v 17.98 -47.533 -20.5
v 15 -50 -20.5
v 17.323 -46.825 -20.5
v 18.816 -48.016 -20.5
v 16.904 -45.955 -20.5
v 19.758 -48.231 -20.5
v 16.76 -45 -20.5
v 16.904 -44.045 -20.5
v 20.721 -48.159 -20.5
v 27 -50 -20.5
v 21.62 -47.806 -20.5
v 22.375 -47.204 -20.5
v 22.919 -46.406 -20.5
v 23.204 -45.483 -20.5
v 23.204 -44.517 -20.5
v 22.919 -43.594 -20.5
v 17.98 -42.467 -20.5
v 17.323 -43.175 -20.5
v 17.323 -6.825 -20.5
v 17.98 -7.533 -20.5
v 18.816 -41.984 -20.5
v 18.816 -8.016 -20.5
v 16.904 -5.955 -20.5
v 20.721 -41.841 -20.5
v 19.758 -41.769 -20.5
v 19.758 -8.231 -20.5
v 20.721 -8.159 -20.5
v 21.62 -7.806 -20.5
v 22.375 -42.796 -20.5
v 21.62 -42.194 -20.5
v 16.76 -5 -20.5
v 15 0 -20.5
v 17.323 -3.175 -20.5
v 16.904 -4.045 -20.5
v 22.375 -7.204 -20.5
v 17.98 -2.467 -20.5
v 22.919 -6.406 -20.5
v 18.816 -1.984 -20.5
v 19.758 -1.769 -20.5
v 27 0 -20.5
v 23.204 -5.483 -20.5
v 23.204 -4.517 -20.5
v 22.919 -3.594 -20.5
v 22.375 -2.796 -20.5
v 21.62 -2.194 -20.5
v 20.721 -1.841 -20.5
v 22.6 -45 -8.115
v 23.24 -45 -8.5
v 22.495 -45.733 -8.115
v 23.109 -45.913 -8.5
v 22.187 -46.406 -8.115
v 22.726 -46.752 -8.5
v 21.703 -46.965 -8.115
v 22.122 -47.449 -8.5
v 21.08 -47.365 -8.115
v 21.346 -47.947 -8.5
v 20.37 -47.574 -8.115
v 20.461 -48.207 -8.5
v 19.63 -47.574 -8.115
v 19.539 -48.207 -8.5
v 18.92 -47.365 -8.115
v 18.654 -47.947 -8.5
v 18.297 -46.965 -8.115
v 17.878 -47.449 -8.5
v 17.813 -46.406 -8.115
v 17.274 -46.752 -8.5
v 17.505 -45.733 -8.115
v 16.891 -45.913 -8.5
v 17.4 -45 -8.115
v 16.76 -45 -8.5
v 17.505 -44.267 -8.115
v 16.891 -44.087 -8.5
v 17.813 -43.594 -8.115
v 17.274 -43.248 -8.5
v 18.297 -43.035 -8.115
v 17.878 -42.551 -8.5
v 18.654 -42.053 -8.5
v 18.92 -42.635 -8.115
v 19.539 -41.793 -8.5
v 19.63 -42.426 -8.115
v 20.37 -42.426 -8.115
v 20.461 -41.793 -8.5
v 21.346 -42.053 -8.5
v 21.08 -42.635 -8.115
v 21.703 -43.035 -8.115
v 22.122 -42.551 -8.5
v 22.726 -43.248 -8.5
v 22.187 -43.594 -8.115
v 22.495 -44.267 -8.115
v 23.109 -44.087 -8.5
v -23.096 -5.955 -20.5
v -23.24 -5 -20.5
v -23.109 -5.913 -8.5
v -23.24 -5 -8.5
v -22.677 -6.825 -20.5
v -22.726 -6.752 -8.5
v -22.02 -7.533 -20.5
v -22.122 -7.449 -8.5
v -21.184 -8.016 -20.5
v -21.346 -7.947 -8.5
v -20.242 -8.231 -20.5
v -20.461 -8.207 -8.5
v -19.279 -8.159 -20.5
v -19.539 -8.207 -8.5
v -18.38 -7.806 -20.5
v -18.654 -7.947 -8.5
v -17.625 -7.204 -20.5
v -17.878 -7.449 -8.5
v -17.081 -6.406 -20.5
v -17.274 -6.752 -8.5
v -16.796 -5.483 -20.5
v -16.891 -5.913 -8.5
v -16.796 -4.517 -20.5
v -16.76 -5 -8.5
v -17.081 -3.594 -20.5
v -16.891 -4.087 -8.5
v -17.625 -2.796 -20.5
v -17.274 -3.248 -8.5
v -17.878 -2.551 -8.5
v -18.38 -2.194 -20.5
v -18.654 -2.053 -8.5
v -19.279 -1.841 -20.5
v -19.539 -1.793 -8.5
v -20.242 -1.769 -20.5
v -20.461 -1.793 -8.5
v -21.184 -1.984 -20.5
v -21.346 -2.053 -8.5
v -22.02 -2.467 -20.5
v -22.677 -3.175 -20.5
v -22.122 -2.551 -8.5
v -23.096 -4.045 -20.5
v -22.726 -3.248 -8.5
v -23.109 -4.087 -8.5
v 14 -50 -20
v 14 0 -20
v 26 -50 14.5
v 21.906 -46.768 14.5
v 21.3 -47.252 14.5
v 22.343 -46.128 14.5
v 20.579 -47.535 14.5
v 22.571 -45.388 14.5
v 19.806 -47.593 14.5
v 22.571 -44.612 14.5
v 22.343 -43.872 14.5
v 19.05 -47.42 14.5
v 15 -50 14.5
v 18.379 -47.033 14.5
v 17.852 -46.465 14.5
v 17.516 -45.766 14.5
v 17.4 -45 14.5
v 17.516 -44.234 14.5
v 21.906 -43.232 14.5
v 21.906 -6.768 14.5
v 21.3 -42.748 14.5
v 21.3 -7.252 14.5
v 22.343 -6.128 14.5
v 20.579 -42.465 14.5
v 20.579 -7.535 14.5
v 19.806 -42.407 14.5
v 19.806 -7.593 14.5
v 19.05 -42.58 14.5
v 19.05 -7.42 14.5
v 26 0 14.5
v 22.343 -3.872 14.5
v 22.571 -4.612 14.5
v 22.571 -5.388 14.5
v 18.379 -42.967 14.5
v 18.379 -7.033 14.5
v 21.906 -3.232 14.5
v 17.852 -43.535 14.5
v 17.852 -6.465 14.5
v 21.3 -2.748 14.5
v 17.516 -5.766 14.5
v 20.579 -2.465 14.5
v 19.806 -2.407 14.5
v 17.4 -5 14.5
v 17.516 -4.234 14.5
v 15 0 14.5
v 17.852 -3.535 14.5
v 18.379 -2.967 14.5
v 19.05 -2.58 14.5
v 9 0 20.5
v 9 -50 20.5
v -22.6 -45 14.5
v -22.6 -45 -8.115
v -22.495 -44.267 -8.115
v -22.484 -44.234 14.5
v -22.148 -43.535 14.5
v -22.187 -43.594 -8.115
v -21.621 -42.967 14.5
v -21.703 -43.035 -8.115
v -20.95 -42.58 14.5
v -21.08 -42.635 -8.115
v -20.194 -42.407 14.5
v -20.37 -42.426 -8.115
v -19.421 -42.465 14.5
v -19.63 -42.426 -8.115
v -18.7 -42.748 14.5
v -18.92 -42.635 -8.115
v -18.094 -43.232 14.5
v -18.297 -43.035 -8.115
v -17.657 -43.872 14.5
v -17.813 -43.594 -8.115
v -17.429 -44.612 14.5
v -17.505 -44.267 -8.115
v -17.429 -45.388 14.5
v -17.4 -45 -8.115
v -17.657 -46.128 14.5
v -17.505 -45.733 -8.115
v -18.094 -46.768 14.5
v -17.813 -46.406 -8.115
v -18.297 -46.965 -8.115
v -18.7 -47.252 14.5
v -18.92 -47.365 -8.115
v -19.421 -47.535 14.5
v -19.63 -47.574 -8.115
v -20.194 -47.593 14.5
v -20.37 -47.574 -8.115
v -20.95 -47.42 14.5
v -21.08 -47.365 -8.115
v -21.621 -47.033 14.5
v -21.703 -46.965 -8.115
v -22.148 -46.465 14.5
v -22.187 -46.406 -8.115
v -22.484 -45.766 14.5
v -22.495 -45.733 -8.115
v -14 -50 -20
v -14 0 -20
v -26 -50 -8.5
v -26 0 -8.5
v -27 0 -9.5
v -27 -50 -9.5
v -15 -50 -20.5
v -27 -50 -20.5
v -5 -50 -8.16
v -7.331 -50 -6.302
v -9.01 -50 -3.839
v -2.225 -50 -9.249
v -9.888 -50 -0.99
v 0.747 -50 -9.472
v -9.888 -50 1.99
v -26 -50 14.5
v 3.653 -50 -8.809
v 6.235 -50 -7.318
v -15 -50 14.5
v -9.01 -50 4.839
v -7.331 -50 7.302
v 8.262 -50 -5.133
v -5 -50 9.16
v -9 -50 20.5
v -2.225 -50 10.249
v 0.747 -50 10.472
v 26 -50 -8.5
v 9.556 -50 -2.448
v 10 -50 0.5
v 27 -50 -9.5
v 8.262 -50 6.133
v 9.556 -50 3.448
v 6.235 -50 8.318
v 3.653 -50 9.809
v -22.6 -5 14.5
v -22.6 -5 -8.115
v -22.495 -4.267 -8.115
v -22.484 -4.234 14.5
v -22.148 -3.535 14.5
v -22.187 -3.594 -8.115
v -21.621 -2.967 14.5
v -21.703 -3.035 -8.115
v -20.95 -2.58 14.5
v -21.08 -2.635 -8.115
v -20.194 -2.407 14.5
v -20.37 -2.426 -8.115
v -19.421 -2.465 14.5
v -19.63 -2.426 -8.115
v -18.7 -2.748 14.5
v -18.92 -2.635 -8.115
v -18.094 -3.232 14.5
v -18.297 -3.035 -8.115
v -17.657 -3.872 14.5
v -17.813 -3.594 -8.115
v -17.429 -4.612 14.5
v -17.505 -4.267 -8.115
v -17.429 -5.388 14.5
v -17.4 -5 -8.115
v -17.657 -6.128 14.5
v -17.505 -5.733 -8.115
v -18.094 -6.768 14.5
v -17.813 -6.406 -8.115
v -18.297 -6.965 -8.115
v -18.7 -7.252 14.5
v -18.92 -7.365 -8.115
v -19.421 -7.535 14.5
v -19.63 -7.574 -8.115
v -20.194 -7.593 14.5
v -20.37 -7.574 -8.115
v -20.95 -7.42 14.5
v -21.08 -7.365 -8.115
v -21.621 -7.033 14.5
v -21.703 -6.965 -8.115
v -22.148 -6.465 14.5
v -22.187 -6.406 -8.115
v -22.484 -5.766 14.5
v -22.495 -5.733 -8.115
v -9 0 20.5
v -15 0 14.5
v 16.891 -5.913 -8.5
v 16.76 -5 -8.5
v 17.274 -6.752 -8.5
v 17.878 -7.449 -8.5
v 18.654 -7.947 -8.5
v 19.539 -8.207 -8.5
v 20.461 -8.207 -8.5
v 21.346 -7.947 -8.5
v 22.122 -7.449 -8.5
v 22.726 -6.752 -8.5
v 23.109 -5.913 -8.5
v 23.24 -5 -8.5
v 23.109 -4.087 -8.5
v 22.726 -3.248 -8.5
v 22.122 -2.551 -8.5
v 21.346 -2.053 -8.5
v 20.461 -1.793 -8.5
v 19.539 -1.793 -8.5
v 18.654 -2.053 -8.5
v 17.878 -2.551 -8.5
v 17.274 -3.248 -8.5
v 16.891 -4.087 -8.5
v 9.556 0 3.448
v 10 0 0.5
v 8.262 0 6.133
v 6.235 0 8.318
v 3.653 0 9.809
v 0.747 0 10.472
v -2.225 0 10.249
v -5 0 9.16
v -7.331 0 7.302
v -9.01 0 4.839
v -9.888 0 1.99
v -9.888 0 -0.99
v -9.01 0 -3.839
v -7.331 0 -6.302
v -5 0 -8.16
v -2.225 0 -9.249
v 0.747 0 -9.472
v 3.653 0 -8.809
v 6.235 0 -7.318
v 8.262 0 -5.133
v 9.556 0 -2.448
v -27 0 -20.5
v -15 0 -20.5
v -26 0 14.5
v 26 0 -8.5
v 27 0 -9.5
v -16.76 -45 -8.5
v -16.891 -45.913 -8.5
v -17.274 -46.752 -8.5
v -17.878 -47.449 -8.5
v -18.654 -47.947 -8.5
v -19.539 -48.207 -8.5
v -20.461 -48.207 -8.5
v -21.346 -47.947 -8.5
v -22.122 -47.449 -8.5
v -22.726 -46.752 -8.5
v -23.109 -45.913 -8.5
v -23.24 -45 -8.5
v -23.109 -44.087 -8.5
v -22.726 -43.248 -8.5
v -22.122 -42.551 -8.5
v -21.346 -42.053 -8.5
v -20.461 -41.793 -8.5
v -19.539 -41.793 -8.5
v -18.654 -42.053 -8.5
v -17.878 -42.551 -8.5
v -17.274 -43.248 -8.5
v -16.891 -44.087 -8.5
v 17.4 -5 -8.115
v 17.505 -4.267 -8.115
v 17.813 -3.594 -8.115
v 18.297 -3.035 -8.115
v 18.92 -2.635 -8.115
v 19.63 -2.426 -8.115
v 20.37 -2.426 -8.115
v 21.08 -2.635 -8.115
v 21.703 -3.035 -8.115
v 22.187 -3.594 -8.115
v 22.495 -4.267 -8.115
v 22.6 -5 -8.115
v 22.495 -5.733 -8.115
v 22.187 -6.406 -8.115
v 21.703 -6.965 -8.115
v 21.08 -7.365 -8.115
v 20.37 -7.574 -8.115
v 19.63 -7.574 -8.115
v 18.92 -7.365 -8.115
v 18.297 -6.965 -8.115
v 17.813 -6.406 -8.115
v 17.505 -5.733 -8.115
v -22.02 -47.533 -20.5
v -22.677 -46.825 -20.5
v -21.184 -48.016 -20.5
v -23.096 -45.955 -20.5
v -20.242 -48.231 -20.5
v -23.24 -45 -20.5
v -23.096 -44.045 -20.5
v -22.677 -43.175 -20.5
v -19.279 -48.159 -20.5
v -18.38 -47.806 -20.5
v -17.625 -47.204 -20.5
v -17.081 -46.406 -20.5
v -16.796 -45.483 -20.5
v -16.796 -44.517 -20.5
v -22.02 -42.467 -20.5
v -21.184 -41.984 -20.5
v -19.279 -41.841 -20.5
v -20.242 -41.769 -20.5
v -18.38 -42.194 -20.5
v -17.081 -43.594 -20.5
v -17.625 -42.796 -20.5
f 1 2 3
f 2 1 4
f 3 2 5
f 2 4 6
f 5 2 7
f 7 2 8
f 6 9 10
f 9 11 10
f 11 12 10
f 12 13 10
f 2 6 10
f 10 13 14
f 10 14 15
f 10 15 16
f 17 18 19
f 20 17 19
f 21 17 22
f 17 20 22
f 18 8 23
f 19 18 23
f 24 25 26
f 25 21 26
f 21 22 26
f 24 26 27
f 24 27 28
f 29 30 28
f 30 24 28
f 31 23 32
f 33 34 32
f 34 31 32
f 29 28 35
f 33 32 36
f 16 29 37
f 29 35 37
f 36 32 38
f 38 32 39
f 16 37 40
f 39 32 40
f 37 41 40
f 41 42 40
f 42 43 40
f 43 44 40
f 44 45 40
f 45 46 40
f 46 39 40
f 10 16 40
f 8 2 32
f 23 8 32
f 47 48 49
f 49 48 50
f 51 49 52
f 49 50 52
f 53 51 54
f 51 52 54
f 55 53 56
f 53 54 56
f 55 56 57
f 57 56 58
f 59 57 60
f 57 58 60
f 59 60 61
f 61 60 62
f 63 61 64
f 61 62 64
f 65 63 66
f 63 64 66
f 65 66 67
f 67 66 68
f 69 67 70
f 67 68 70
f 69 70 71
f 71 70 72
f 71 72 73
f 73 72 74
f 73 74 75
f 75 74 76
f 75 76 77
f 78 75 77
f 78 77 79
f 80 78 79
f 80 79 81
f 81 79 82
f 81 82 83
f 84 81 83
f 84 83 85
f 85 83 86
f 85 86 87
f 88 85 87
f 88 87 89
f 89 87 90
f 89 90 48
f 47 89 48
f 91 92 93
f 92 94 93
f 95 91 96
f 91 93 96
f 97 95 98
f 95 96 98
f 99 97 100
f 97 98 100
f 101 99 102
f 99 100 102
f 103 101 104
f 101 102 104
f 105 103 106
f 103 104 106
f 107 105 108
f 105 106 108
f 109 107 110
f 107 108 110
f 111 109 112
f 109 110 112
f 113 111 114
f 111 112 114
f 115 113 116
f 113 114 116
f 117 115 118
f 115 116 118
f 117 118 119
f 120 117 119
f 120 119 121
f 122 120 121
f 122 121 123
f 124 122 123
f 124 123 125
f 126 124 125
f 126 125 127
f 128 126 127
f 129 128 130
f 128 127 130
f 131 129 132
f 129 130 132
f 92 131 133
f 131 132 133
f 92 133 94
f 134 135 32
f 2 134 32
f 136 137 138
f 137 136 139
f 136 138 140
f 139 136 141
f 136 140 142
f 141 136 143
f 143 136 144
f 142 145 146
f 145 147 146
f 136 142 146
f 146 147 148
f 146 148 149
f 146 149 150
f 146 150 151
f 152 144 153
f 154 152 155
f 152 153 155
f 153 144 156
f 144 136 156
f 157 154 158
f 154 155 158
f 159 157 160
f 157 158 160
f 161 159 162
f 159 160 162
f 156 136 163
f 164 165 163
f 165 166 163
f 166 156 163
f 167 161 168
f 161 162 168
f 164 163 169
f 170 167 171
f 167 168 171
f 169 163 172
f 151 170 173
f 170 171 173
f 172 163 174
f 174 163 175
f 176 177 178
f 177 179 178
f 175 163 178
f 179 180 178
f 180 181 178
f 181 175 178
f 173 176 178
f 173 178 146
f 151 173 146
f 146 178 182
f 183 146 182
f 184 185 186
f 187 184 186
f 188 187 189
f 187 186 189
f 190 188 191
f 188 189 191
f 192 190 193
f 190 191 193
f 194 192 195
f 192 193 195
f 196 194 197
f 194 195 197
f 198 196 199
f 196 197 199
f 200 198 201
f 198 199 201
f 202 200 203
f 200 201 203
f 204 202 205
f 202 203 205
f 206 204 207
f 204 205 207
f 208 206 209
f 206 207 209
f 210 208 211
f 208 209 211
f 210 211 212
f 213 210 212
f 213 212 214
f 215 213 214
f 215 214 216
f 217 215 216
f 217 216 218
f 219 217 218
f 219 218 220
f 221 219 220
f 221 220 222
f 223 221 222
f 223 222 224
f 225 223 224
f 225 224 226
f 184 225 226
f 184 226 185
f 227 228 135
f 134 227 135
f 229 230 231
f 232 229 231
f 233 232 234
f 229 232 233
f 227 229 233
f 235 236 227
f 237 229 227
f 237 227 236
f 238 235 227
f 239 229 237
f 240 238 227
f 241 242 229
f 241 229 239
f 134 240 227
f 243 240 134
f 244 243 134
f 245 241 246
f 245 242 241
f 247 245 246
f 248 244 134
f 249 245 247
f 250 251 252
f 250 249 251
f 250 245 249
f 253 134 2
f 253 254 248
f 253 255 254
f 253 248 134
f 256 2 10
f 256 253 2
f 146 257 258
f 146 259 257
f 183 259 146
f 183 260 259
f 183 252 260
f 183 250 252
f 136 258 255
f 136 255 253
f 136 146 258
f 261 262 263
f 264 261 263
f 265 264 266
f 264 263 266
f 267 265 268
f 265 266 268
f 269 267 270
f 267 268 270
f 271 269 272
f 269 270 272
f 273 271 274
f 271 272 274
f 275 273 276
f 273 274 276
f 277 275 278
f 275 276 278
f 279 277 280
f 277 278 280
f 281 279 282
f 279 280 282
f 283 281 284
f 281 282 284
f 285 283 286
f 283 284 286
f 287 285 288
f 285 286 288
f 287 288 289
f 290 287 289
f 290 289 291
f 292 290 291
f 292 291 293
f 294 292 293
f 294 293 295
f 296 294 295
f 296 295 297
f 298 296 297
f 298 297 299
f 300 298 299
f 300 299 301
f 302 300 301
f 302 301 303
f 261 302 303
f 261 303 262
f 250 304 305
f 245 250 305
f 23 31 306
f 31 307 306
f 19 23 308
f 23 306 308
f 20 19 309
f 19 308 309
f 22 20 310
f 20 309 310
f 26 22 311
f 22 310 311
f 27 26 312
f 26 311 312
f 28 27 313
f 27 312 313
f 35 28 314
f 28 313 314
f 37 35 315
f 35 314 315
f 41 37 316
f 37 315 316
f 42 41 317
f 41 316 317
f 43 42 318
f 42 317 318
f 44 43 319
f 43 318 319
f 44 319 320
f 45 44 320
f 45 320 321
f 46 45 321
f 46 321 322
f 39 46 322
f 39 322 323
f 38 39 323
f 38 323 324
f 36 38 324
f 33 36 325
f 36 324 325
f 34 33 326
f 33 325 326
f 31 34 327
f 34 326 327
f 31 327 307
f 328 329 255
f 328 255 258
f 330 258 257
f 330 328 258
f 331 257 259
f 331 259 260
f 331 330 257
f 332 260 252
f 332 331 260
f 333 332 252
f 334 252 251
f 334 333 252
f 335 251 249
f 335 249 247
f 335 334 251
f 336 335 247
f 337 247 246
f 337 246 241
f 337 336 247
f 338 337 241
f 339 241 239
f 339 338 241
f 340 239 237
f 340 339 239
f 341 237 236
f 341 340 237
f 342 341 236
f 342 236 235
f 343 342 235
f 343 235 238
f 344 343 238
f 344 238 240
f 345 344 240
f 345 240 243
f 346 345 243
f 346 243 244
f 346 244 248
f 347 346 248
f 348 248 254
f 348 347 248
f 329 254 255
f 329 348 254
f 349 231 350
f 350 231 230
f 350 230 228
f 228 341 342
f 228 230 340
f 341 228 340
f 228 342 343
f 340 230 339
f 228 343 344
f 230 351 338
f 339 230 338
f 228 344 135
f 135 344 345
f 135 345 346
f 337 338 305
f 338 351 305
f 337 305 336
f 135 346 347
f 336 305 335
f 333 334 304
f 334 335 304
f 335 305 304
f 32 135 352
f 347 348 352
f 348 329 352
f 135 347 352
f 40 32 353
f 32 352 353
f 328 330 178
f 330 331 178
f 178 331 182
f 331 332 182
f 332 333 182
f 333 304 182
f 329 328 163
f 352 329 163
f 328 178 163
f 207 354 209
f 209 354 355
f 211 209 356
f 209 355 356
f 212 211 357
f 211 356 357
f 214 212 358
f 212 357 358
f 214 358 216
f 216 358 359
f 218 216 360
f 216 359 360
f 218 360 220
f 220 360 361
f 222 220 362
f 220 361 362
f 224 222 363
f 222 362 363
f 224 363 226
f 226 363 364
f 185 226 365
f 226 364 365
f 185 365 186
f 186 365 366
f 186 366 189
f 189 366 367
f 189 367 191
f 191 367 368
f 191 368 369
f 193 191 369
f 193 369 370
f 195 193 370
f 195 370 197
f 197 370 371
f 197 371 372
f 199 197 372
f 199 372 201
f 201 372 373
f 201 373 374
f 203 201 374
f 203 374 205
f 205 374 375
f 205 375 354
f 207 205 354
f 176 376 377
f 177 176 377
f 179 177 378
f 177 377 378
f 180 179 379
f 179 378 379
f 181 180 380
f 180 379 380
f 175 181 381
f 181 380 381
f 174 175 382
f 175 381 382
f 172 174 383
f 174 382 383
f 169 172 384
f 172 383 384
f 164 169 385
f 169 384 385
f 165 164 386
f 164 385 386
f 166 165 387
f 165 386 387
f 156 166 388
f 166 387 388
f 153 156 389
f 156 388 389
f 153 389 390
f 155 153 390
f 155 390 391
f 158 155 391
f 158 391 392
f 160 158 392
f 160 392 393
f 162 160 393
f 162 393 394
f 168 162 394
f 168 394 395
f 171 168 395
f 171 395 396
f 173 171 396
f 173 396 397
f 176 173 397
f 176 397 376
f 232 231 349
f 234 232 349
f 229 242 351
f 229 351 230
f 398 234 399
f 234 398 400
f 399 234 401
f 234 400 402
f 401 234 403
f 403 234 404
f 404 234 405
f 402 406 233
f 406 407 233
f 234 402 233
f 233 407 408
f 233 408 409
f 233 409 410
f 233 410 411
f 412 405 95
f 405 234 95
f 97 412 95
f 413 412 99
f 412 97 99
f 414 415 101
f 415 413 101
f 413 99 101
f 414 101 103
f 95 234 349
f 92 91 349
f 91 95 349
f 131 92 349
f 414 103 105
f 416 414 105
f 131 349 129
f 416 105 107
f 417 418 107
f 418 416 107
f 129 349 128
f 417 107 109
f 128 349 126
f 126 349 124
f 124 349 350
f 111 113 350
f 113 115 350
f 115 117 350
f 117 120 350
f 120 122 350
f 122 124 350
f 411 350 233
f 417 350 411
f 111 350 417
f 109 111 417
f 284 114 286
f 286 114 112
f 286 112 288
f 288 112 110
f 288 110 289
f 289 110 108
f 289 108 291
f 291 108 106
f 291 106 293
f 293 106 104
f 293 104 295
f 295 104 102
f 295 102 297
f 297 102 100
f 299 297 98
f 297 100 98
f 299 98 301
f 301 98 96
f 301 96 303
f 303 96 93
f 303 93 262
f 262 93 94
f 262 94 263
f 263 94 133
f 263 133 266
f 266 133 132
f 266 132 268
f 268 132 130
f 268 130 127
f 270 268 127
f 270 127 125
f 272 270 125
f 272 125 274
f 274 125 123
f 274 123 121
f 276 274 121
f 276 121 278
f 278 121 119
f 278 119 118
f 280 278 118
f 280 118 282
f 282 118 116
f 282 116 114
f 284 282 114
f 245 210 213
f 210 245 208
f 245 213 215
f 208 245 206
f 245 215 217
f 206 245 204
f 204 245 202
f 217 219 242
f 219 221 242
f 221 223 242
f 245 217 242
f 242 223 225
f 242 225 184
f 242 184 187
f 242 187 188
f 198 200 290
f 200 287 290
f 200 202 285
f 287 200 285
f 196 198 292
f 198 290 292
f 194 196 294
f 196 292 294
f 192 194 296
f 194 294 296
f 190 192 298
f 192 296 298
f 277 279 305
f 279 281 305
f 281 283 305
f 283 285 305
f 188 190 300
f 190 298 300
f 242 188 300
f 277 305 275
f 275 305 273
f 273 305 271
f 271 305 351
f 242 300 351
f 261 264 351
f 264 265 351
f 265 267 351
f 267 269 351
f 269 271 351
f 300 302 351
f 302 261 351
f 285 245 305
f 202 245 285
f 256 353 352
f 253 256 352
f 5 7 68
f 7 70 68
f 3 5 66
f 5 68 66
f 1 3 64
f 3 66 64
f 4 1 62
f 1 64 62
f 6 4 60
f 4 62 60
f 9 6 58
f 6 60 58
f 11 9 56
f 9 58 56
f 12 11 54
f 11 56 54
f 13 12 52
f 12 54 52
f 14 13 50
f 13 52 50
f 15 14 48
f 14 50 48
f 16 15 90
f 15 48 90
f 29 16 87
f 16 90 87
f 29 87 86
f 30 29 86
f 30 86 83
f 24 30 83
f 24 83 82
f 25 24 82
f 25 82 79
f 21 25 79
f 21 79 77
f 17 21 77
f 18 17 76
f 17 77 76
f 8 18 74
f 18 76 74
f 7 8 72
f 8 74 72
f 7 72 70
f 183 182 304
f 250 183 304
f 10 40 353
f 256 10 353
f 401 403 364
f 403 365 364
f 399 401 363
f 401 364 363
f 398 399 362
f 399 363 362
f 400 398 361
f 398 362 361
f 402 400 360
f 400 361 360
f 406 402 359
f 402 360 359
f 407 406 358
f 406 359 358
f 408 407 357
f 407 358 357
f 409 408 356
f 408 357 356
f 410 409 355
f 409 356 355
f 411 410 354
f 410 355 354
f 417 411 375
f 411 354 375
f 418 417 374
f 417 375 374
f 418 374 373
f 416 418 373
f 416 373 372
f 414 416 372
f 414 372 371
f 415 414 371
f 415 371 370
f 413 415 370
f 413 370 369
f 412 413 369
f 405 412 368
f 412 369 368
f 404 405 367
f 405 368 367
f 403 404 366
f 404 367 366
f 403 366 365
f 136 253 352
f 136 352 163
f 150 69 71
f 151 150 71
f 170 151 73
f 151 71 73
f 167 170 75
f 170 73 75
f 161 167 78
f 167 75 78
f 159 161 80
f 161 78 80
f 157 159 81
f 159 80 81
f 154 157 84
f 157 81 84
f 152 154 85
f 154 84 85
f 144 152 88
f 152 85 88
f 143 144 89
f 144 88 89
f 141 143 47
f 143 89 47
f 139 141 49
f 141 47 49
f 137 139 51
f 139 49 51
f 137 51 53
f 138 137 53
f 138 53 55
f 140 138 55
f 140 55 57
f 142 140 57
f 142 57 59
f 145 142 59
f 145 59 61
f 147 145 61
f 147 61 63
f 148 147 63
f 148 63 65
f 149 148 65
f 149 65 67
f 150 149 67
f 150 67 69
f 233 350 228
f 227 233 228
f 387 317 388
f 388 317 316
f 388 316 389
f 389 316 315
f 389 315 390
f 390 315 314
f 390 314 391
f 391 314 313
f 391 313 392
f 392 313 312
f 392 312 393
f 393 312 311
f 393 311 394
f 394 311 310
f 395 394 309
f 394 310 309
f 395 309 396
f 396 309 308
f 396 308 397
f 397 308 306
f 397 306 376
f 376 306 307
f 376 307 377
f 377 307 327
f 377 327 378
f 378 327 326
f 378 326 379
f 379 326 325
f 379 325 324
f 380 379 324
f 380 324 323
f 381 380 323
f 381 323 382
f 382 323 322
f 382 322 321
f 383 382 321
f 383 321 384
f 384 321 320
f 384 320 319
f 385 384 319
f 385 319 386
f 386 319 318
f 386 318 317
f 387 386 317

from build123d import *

# Parameters (mm, degrees)
F0_R      = 10
F1_DEPTH  = 50
F5_D      = 6.48
F5_DEPTH  = 12
F5_TIP    = 1.9467884056
F6_D      = 6.48
F6_DEPTH  = 12
F6_TIP    = 1.9467884056
F7_D      = 6.48
F7_DEPTH  = 12
F7_TIP    = 1.9467884056
F8_D      = 6.48
F8_DEPTH  = 12
F8_TIP    = 1.9467884056
F9_D      = 5.2
F9_DEPTH  = 23
F9_TIP    = 1.5622376095
F10_D     = 5.2
F10_DEPTH = 23
F10_TIP   = 1.5622376095
F11_D     = 5.2
F11_DEPTH = 23
F11_TIP   = 1.5622376095
F12_D     = 5.2
F12_DEPTH = 23
F12_TIP   = 1.5622376095


with BuildPart() as f1:
    # F0 (on Front) → F1 (new body)
    with BuildSketch(Plane.XZ):
        Polygon((15, -20.5), (27, -20.5), (27, -9.5), (26, -8.5), (26, 14.5), (15, 14.5), (9, 20.5), (-9, 20.5), (-15, 14.5), (-26, 14.5), (-26, -8.5), (-27, -9.5), (-27, -20.5), (-15, -20.5), (-14, -20), (14, -20), align=None)
        with Locations((0, 0.5)):
            Circle(F0_R, mode=Mode.SUBTRACT)
    extrude(amount=F1_DEPTH)

    # F5
    with Locations(Plane(origin=(0, 0, -20.5), x_dir=(1, 0, 0), z_dir=(0, 0, -1))):
        with Locations((20, 45)):
            Hole(F5_D / 2, depth=F5_DEPTH)
            with Locations((0, 0, -(F5_DEPTH + F5_TIP / 2))):  # 118° drill point
                Cone(0, F5_D / 2, F5_TIP, mode=Mode.SUBTRACT)

    # F6
    with Locations(Plane(origin=(0, 0, -20.5), x_dir=(1, 0, 0), z_dir=(0, 0, -1))):
        with Locations((-20, 45)):
            Hole(F6_D / 2, depth=F6_DEPTH)
            with Locations((0, 0, -(F6_DEPTH + F6_TIP / 2))):  # 118° drill point
                Cone(0, F6_D / 2, F6_TIP, mode=Mode.SUBTRACT)

    # F7
    with Locations(Plane(origin=(0, 0, -20.5), x_dir=(1, 0, 0), z_dir=(0, 0, -1))):
        with Locations((20, 5)):
            Hole(F7_D / 2, depth=F7_DEPTH)
            with Locations((0, 0, -(F7_DEPTH + F7_TIP / 2))):  # 118° drill point
                Cone(0, F7_D / 2, F7_TIP, mode=Mode.SUBTRACT)

    # F8
    with Locations(Plane(origin=(0, 0, -20.5), x_dir=(1, 0, 0), z_dir=(0, 0, -1))):
        with Locations((-20, 5)):
            Hole(F8_D / 2, depth=F8_DEPTH)
            with Locations((0, 0, -(F8_DEPTH + F8_TIP / 2))):  # 118° drill point
                Cone(0, F8_D / 2, F8_TIP, mode=Mode.SUBTRACT)

    # F9
    with Locations(Plane.XY.offset(14.5)):
        with Locations((20, -45)):
            Hole(F9_D / 2, depth=F9_DEPTH)
            with Locations((0, 0, -(F9_DEPTH + F9_TIP / 2))):  # 118° drill point
                Cone(0, F9_D / 2, F9_TIP, mode=Mode.SUBTRACT)

    # F10
    with Locations(Plane.XY.offset(14.5)):
        with Locations((-20, -45)):
            Hole(F10_D / 2, depth=F10_DEPTH)
            with Locations((0, 0, -(F10_DEPTH + F10_TIP / 2))):  # 118° drill point
                Cone(0, F10_D / 2, F10_TIP, mode=Mode.SUBTRACT)

    # F11
    with Locations(Plane.XY.offset(14.5)):
        with Locations((-20, -5)):
            Hole(F11_D / 2, depth=F11_DEPTH)
            with Locations((0, 0, -(F11_DEPTH + F11_TIP / 2))):  # 118° drill point
                Cone(0, F11_D / 2, F11_TIP, mode=Mode.SUBTRACT)

    # F12
    with Locations(Plane.XY.offset(14.5)):
        with Locations((20, -5)):
            Hole(F12_D / 2, depth=F12_DEPTH)
            with Locations((0, 0, -(F12_DEPTH + F12_TIP / 2))):  # 118° drill point
                Cone(0, F12_D / 2, F12_TIP, mode=Mode.SUBTRACT)


solid = f1.part
